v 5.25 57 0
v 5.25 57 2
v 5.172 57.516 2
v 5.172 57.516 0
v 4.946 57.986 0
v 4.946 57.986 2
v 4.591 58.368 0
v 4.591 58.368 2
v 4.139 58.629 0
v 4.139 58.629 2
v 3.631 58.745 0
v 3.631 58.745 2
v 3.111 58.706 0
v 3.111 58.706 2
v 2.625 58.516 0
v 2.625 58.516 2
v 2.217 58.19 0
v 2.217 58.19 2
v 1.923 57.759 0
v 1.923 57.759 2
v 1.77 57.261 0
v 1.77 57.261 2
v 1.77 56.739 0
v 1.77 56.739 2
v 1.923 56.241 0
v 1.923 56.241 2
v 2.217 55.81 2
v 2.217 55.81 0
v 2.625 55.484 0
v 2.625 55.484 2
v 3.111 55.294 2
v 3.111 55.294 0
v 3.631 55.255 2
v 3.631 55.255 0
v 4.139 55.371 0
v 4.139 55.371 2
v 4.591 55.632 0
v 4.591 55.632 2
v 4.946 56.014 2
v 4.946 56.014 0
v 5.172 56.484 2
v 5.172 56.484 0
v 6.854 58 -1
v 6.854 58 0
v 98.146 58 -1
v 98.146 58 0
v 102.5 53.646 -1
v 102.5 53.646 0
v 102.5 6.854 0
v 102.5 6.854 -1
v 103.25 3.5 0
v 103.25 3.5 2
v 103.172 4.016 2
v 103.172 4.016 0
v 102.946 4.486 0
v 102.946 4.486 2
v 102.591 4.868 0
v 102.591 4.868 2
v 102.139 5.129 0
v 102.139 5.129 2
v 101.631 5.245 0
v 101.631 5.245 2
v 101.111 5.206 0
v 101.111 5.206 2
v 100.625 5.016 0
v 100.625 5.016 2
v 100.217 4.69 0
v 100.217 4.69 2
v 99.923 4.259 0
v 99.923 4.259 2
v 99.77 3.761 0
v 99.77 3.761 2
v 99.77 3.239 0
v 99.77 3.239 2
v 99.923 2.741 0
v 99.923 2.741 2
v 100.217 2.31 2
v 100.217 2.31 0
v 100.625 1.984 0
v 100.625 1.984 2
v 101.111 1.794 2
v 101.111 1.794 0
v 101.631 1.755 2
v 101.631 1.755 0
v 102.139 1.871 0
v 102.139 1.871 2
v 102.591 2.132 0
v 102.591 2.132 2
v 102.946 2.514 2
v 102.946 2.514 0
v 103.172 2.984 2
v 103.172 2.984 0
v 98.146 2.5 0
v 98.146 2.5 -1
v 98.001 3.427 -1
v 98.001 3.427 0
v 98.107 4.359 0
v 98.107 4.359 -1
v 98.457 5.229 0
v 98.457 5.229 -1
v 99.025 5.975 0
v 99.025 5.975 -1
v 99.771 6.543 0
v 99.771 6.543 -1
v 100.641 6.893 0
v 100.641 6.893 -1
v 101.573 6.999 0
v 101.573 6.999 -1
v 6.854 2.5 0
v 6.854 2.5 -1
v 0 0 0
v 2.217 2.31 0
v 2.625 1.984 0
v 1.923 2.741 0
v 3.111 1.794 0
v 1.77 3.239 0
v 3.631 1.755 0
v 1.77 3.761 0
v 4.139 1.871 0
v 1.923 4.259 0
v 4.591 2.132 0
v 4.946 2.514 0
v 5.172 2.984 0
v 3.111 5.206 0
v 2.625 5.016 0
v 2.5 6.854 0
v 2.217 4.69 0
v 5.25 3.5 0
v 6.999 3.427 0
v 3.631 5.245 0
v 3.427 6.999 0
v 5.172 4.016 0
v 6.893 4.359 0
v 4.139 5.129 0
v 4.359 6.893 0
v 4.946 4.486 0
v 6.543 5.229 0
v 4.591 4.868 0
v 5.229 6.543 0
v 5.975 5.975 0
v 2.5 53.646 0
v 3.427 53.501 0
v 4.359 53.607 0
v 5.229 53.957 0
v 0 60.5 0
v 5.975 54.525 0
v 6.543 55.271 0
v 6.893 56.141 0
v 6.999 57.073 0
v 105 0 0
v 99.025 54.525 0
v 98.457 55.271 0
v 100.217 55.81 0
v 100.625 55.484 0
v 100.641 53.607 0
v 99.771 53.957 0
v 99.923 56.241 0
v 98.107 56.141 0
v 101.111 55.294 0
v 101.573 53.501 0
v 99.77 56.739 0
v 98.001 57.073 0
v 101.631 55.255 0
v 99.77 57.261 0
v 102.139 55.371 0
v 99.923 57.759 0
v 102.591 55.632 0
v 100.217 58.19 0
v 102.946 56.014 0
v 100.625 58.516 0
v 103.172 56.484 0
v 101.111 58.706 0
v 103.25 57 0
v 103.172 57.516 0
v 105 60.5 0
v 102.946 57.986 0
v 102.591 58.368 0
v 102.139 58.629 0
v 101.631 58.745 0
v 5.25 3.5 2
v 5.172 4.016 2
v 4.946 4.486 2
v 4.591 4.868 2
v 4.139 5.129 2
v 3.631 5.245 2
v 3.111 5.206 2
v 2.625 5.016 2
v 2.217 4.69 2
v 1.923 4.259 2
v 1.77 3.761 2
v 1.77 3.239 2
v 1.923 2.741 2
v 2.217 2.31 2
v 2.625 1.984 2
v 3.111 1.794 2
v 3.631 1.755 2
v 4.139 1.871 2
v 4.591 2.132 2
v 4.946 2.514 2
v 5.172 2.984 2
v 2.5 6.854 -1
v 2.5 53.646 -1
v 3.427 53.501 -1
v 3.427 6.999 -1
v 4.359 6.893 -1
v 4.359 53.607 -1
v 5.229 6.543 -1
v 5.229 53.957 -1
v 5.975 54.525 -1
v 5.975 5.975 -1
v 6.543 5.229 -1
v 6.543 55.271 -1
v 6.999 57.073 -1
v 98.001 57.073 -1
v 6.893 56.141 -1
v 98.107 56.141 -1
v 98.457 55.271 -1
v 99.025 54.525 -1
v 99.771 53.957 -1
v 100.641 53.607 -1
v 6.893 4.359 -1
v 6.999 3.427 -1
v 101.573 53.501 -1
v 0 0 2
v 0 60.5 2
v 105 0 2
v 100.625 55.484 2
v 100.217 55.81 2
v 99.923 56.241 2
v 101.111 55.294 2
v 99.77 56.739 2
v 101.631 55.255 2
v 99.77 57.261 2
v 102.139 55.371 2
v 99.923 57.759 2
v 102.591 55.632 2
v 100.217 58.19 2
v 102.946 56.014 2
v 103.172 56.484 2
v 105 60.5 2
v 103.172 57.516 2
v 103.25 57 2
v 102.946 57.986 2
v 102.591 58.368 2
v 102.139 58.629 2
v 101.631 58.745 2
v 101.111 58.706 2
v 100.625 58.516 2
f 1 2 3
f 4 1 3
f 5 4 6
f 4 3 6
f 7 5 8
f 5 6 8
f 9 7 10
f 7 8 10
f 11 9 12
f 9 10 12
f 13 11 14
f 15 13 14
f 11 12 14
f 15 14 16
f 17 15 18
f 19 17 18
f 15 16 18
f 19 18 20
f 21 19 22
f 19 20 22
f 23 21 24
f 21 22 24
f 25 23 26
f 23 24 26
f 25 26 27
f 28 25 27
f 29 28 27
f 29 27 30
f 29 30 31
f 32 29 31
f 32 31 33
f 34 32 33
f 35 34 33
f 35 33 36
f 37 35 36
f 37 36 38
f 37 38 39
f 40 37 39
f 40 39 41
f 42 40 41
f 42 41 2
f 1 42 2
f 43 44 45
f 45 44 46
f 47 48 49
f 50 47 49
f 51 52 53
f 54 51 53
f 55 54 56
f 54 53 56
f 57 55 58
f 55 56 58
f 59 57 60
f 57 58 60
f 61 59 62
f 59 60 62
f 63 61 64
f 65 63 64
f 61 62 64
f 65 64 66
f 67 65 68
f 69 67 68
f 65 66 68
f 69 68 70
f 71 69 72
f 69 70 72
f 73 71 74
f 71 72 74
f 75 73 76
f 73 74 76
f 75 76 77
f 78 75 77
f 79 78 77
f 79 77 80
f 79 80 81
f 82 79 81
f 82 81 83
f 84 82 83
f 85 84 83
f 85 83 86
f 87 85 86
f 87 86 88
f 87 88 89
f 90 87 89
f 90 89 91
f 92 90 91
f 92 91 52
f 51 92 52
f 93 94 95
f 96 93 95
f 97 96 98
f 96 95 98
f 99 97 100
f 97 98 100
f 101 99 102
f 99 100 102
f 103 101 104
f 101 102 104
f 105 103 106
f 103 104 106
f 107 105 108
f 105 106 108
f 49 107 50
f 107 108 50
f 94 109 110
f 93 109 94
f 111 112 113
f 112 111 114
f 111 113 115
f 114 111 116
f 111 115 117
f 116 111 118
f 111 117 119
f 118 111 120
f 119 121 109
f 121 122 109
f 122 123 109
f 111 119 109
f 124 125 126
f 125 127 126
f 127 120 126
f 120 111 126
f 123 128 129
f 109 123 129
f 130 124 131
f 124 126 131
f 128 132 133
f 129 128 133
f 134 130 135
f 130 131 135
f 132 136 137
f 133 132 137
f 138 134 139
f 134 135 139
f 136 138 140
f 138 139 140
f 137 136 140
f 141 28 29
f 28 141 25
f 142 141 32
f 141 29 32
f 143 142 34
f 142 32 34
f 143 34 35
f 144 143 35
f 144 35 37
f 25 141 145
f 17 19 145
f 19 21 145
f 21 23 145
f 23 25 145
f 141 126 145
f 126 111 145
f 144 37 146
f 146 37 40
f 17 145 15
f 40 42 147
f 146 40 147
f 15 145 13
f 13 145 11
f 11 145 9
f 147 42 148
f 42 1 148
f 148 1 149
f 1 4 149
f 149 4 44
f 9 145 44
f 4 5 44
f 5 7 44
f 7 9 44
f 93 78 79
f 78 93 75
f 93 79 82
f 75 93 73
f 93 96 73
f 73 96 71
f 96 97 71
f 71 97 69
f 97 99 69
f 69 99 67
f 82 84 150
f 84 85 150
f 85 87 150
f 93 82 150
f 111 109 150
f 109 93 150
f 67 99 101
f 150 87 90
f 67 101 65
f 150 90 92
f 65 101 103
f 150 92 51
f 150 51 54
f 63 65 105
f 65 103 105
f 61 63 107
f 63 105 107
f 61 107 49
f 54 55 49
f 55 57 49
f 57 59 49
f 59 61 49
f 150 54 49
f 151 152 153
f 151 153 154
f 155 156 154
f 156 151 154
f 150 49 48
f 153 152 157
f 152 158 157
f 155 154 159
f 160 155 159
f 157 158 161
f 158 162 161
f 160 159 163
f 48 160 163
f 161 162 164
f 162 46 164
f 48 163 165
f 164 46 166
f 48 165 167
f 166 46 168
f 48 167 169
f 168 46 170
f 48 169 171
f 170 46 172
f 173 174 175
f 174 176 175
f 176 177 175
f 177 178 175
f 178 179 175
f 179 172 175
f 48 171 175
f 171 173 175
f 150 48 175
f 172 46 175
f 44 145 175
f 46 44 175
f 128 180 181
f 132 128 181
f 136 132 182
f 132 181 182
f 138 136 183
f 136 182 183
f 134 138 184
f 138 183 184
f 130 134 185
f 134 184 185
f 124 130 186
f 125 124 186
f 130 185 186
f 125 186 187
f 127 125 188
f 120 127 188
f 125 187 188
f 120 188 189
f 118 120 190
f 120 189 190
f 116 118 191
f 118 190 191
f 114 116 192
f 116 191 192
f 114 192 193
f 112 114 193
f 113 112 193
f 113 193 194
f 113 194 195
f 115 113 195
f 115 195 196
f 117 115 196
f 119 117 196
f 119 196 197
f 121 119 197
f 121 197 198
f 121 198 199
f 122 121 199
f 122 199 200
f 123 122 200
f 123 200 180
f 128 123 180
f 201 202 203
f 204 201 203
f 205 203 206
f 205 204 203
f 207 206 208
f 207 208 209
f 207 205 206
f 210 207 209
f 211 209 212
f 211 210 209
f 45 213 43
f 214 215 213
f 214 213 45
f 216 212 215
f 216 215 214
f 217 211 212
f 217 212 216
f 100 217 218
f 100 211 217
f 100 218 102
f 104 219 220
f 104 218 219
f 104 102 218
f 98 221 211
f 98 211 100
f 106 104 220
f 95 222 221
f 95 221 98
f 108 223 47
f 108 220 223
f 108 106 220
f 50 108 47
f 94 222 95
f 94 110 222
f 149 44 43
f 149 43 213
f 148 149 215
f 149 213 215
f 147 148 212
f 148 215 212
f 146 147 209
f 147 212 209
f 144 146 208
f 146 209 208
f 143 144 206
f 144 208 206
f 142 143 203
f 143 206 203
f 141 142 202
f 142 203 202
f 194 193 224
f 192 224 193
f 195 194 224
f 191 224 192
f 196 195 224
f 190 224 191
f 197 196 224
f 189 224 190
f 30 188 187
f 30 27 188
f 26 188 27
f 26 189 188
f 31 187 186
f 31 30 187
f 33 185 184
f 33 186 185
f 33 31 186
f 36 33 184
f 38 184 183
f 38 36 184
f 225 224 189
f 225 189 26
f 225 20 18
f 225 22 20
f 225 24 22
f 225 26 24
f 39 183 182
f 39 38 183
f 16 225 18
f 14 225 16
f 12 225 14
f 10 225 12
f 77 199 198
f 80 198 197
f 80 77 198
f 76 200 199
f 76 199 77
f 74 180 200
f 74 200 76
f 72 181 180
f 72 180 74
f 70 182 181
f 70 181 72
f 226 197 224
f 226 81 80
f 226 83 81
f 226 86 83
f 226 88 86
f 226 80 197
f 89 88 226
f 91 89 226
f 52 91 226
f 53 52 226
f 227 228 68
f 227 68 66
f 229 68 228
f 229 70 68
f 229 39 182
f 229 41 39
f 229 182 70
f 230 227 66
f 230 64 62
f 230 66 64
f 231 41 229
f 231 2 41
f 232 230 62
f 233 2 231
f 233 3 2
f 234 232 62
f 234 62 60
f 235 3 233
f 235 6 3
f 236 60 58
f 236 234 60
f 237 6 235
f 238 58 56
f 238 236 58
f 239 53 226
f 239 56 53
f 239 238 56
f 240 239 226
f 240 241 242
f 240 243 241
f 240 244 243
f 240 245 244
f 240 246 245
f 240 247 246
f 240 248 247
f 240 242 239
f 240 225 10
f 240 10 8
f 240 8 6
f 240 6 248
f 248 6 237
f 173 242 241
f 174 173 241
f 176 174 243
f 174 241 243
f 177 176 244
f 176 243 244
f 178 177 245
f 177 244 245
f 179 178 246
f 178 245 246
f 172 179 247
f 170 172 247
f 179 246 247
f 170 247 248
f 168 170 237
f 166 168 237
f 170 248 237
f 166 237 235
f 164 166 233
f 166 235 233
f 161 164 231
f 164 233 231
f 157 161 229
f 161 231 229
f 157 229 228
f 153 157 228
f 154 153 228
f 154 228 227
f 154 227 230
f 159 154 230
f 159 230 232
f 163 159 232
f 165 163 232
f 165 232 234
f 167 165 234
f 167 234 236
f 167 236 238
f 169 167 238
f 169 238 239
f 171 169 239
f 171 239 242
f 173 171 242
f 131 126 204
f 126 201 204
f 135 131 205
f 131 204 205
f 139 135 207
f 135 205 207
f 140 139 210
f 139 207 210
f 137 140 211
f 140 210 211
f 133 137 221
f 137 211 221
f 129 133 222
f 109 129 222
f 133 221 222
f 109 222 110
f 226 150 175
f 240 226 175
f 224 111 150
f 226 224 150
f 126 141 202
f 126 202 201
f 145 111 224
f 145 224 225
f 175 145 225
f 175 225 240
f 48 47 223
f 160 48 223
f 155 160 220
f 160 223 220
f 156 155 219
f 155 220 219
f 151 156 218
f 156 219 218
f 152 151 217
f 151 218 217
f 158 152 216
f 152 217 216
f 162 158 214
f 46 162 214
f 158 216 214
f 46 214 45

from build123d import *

# Parameters (mm, degrees)
SKETCH_W        = 105
SKETCH_H        = 60.5
PAD_DEPTH       = 2
SKETCH001_W     = 100
SKETCH001_H     = 55.5
PAD001_DEPTH    = 1
SKETCH002_R     = 3.5
POCKET_DEPTH    = 1
SKETCH003_R     = 1.75
POCKET001_DEPTH = 3.001


with BuildPart() as part:
    # Sketch → Pad (new body)
    with BuildSketch(Plane.XY):
        with Locations((52.5, 30.25)):
            Rectangle(SKETCH_W, SKETCH_H)
    extrude(amount=PAD_DEPTH)

    # Sketch001 → Pad001 (new body)
    with BuildSketch(Plane(origin=(0, 0, 0), x_dir=(1, 0, 0), z_dir=(0, 0, -1))):
        with Locations((52.5, -30.25)):
            Rectangle(SKETCH001_W, SKETCH001_H)
    extrude(amount=PAD001_DEPTH)

    # Sketch002 → Pocket (cut)
    with BuildSketch(Plane(origin=(0, 0, -1), x_dir=(1, 0, 0), z_dir=(0, 0, -1))):
        with Locations((3.5, -3.5)):
            Circle(SKETCH002_R)
        with Locations((3.5, -57)):
            Circle(SKETCH002_R)
        with Locations((101.5, -3.5)):
            Circle(SKETCH002_R)
        with Locations((101.5, -57)):
            Circle(SKETCH002_R)
    extrude(amount=-POCKET_DEPTH, mode=Mode.SUBTRACT)

    # Sketch003 → Pocket001 (cut, through all)
    with BuildSketch(Plane.XY.offset(2)):
        with Locations((3.5, 57)):
            Circle(SKETCH003_R)
        with Locations((101.5, 57)):
            Circle(SKETCH003_R)
        with Locations((3.5, 3.5)):
            Circle(SKETCH003_R)
        with Locations((101.5, 3.5)):
            Circle(SKETCH003_R)
    extrude(amount=-POCKET001_DEPTH, mode=Mode.SUBTRACT)


solid = part.part
